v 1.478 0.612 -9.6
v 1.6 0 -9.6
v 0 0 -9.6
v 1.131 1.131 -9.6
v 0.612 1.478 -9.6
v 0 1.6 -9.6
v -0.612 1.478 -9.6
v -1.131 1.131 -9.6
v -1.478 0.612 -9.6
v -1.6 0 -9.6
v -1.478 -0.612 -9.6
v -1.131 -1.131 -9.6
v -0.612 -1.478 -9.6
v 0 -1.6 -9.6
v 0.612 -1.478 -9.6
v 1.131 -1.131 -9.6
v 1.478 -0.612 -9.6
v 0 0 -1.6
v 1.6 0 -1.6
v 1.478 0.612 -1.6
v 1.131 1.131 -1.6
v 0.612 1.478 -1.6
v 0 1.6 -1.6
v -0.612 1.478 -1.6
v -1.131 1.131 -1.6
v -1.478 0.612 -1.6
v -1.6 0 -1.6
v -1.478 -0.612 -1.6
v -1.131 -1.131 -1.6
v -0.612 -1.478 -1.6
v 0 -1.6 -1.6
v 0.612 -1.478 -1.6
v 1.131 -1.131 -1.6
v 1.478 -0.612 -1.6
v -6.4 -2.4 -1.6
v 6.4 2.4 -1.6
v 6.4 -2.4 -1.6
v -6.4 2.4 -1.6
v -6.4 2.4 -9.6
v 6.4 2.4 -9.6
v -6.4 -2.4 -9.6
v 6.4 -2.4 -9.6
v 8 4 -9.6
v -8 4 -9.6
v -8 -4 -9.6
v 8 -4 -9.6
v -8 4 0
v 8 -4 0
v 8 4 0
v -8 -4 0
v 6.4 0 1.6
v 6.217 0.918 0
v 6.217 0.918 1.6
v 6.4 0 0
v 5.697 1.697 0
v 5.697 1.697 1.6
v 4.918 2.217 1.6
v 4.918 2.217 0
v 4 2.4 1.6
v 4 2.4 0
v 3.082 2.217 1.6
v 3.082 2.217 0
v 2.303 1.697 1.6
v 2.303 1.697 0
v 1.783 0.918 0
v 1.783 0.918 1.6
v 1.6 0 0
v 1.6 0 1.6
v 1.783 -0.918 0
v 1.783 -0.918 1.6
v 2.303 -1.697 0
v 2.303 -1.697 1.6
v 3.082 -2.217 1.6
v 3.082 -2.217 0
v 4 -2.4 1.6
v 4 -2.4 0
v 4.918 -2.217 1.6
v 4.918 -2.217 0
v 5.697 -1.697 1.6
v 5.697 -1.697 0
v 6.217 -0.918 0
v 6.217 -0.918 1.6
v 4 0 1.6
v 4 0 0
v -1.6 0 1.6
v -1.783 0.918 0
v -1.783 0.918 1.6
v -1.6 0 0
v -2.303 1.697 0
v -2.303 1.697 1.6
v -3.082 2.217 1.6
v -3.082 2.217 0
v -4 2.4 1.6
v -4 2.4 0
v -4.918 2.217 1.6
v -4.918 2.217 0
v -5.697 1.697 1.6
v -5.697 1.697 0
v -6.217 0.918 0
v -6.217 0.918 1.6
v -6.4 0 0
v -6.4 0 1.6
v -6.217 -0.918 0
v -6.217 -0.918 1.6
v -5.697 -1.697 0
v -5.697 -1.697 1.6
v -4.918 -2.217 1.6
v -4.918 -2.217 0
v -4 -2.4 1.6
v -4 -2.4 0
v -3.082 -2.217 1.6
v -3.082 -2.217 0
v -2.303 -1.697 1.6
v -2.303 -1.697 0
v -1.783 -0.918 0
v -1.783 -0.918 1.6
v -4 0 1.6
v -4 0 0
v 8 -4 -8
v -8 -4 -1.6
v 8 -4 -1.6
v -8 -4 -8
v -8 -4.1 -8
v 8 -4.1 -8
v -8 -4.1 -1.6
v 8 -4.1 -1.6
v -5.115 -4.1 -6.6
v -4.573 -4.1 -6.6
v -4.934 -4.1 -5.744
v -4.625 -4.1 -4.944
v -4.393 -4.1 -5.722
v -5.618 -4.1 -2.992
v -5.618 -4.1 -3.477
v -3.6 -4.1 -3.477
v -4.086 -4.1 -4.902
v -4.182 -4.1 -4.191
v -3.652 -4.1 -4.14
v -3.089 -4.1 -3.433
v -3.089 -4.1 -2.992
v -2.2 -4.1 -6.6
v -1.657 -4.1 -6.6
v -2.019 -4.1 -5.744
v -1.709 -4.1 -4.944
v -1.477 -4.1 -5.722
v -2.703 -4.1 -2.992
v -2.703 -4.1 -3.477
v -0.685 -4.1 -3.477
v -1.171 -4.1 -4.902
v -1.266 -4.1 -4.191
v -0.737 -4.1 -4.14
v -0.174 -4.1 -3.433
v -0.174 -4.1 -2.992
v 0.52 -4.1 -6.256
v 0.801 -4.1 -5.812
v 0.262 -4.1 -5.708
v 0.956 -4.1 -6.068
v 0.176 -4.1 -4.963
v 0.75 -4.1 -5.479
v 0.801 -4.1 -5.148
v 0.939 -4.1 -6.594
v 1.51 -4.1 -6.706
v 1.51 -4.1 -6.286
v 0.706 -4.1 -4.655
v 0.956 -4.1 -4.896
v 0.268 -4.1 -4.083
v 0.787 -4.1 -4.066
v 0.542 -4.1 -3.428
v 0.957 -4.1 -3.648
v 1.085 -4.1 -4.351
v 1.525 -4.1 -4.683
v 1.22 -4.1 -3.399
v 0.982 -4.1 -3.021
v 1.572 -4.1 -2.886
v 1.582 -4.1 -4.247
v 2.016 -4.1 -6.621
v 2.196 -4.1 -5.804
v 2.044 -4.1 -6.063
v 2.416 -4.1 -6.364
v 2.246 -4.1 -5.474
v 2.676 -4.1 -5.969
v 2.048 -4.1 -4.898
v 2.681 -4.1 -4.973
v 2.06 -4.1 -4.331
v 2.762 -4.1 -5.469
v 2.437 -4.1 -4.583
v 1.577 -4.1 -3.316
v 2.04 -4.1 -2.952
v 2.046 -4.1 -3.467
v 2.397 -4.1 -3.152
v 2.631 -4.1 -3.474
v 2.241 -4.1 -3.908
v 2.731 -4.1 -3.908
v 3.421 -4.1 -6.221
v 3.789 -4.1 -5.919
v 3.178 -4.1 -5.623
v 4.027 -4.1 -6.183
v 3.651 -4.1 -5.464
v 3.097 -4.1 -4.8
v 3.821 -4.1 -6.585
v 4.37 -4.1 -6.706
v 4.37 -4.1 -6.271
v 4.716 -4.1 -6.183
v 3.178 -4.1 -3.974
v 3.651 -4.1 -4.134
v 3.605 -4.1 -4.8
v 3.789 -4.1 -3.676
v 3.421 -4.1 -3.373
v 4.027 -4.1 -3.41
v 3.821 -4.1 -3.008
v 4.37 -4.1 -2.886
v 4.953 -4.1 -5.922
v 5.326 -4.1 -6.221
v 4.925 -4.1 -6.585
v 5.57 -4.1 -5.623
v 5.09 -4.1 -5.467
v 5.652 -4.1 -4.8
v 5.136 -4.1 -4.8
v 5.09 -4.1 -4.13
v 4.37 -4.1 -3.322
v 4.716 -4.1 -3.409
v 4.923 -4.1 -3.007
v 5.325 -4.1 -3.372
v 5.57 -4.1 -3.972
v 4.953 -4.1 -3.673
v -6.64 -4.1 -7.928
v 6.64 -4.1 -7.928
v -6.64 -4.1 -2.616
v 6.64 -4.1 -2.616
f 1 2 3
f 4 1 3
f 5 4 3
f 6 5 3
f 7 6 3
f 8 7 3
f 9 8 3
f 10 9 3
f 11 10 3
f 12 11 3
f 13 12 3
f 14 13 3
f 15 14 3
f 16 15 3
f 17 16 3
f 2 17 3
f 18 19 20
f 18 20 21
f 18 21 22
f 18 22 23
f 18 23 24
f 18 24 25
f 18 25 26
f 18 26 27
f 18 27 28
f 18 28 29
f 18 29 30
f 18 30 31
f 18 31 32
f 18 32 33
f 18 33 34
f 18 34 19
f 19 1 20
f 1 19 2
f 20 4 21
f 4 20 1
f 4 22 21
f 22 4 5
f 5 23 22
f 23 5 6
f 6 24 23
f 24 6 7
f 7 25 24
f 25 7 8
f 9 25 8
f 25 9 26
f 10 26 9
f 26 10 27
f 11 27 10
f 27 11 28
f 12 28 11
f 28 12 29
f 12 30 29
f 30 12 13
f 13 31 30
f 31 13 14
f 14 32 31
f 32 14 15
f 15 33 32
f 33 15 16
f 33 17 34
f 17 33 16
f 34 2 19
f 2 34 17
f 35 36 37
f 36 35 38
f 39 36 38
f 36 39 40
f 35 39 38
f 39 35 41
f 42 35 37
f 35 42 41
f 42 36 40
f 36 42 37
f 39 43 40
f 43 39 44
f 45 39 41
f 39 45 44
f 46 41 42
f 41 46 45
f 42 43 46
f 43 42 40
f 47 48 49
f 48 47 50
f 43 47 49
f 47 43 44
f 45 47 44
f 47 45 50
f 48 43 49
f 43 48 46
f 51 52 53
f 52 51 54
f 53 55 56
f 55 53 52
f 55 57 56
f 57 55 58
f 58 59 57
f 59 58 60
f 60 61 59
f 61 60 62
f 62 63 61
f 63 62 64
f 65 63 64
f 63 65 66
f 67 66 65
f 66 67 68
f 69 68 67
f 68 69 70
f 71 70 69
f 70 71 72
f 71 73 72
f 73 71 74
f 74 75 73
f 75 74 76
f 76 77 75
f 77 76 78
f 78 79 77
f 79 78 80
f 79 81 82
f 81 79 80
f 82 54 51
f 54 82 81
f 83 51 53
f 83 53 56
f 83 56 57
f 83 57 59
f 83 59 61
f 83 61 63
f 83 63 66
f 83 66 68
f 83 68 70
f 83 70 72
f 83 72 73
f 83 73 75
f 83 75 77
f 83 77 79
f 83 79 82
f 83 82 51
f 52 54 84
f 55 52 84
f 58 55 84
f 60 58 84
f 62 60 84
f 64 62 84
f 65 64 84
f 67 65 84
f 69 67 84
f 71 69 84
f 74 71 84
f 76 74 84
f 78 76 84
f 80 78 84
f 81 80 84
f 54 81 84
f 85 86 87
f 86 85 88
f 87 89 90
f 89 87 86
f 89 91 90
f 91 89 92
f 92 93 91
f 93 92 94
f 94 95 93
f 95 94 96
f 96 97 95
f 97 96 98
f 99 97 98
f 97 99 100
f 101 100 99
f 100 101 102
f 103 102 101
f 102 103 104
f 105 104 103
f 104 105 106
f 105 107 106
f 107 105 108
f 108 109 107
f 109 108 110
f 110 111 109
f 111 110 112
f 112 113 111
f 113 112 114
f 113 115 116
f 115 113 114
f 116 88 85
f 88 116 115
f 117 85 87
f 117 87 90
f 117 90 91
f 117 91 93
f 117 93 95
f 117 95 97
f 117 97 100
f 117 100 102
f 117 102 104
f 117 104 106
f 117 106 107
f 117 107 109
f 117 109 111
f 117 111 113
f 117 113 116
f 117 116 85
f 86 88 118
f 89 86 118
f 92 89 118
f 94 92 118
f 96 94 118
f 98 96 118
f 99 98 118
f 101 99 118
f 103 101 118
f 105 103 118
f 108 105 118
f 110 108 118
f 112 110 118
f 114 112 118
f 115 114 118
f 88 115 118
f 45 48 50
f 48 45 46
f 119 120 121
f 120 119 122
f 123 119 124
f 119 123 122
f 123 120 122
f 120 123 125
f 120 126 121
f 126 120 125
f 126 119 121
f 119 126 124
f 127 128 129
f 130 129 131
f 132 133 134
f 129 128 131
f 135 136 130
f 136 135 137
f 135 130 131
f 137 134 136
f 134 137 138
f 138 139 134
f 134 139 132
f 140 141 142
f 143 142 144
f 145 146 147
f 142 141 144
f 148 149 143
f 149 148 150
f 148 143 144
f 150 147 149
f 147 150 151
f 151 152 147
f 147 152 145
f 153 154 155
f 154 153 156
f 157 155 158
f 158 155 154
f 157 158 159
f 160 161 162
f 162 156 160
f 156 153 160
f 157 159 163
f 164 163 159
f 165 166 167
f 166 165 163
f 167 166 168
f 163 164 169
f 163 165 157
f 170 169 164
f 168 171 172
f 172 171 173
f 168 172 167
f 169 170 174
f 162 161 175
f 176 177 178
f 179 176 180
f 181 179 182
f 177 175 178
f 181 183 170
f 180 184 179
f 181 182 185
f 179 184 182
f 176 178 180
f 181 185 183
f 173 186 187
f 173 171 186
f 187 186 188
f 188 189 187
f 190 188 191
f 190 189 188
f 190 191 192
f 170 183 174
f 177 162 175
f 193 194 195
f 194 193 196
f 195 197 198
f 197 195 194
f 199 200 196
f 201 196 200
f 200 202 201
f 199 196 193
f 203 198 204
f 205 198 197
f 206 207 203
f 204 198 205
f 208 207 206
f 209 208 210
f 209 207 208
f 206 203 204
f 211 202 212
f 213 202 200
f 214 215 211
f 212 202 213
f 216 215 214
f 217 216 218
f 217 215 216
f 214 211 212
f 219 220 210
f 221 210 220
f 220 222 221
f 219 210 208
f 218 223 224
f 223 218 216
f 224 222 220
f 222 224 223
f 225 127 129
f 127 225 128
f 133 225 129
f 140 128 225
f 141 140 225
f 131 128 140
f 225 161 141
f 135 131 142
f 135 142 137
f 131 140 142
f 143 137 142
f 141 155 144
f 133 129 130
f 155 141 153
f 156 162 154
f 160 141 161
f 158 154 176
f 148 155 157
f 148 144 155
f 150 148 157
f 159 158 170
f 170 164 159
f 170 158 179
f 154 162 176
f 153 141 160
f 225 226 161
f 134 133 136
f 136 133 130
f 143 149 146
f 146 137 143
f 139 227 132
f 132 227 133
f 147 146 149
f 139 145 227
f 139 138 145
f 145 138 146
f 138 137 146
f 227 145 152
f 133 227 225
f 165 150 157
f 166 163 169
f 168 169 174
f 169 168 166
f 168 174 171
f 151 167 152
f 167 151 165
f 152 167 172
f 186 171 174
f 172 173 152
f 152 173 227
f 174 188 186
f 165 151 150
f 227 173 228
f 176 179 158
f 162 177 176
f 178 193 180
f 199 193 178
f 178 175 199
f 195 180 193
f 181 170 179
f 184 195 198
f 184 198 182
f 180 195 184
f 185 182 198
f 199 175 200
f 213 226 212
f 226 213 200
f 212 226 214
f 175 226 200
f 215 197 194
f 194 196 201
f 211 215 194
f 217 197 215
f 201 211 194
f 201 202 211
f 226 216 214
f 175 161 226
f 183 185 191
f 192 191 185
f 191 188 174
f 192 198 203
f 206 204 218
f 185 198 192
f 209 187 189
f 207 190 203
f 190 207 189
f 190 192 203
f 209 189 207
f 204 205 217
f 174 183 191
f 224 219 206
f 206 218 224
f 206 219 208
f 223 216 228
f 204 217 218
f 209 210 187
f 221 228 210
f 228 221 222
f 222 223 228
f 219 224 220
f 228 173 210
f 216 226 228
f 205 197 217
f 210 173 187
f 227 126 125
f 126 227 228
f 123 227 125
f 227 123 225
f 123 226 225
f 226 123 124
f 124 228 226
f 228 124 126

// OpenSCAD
// file: ../p/4-4edge.scad
use <../lib.scad>
function ldraw_lib__4_4edge() = [
// 0 Circle 1.0
// 0 Name: 4-4edge.dat
// 0 Author: James Jessiman
// 0 !LDRAW_ORG Primitive UPDATE 2017-01
// 0 !LICENSE Licensed under CC BY 2.0 and CC BY 4.0 : see CAreadme.txt
// 
// 0 BFC CERTIFY CCW
  [0,"BFC","CERTIFY"],
  [0,"BFC","CCW"],
// 
// 0 !HISTORY 1998-12-15 [PTadmin] Official Update 1998-10
// 0 !HISTORY 2005-12-28 [PTadmin] Official Update 2005-01
// 0 !HISTORY 2007-06-24 [PTadmin] Header formatted for Contributor Agreement
// 0 !HISTORY 2008-07-01 [PTadmin] Official Update 2008-01
// 0 !HISTORY 2017-01-15 [Steffen] BFCed
// 0 !HISTORY 2017-12-30 [PTadmin] Official Update 2017-01
// 
// 
// 2 24 1 0 0 0.9239 0 0.3827
  [2,24,1,0,0,0.9239,0,0.3827],
// 2 24 0.9239 0 0.3827 0.7071 0 0.7071
  [2,24,0.9239,0,0.3827,0.7071,0,0.7071],
// 2 24 0.7071 0 0.7071 0.3827 0 0.9239
  [2,24,0.7071,0,0.7071,0.3827,0,0.9239],
// 2 24 0.3827 0 0.9239 0 0 1
  [2,24,0.3827,0,0.9239,0,0,1],
// 2 24 0 0 1 -0.3827 0 0.9239
  [2,24,0,0,1,-0.3827,0,0.9239],
// 2 24 -0.3827 0 0.9239 -0.7071 0 0.7071
  [2,24,-0.3827,0,0.9239,-0.7071,0,0.7071],
// 2 24 -0.7071 0 0.7071 -0.9239 0 0.3827
  [2,24,-0.7071,0,0.7071,-0.9239,0,0.3827],
// 2 24 -0.9239 0 0.3827 -1 0 -0
  [2,24,-0.9239,0,0.3827,-1,0,-0],
// 2 24 -1 0 -0 -0.9239 0 -0.3827
  [2,24,-1,0,-0,-0.9239,0,-0.3827],
// 2 24 -0.9239 0 -0.3827 -0.7071 0 -0.7071
  [2,24,-0.9239,0,-0.3827,-0.7071,0,-0.7071],
// 2 24 -0.7071 0 -0.7071 -0.3827 0 -0.9239
  [2,24,-0.7071,0,-0.7071,-0.3827,0,-0.9239],
// 2 24 -0.3827 0 -0.9239 0 0 -1
  [2,24,-0.3827,0,-0.9239,0,0,-1],
// 2 24 0 0 -1 0.3827 0 -0.9239
  [2,24,0,0,-1,0.3827,0,-0.9239],
// 2 24 0.3827 0 -0.9239 0.7071 0 -0.7071
  [2,24,0.3827,0,-0.9239,0.7071,0,-0.7071],
// 2 24 0.7071 0 -0.7071 0.9239 0 -0.3827
  [2,24,0.7071,0,-0.7071,0.9239,0,-0.3827],
// 2 24 0.9239 0 -0.3827 1 0 0
  [2,24,0.9239,0,-0.3827,1,0,0],
];
module ldraw_lib__4_4edge(step=0, col=false, unit=2/5, alt=false, line=0.2, solid=!$preview)
    makepoly(ldraw_lib__4_4edge(), step=step, col=col, unit=unit, alt=alt, line=line, solid=solid);
ldraw_lib__4_4edge(line=0.2);
// file: ../p/4-4disc.scad
use <../lib.scad>
function ldraw_lib__4_4disc() = [
// 0 Disc 1.0
// 0 Name: 4-4disc.dat
// 0 Author: James Jessiman
// 0 !LDRAW_ORG Primitive UPDATE 2002-02
// 0 !LICENSE Licensed under CC BY 2.0 and CC BY 4.0 : see CAreadme.txt
// 
// 0 BFC CERTIFY CCW
  [0,"BFC","CERTIFY"],
  [0,"BFC","CCW"],
// 
// 0 !HISTORY 1998-12-15 [PTadmin] Official Update 1998-10
// 0 !HISTORY 2002-03-23 [sbliss] Added BFC statement
// 0 !HISTORY 2002-04-25 [PTadmin] Official Update 2002-02
// 0 !HISTORY 2007-06-24 [PTadmin] Header formatted for Contributor Agreement
// 0 !HISTORY 2008-07-01 [PTadmin] Official Update 2008-01
// 
// 
// 3 16 0 0 0 1 0 0 0.9239 0 0.3827
  [3,16,0,0,0,1,0,0,0.9239,0,0.3827],
// 3 16 0 0 0 0.9239 0 0.3827 0.7071 0 0.7071
  [3,16,0,0,0,0.9239,0,0.3827,0.7071,0,0.7071],
// 3 16 0 0 0 0.7071 0 0.7071 0.3827 0 0.9239
  [3,16,0,0,0,0.7071,0,0.7071,0.3827,0,0.9239],
// 3 16 0 0 0 0.3827 0 0.9239 0 0 1
  [3,16,0,0,0,0.3827,0,0.9239,0,0,1],
// 3 16 0 0 0 0 0 1 -0.3827 0 0.9239
  [3,16,0,0,0,0,0,1,-0.3827,0,0.9239],
// 3 16 0 0 0 -0.3827 0 0.9239 -0.7071 0 0.7071
  [3,16,0,0,0,-0.3827,0,0.9239,-0.7071,0,0.7071],
// 3 16 0 0 0 -0.7071 0 0.7071 -0.9239 0 0.3827
  [3,16,0,0,0,-0.7071,0,0.7071,-0.9239,0,0.3827],
// 3 16 0 0 0 -0.9239 0 0.3827 -1 0 -0
  [3,16,0,0,0,-0.9239,0,0.3827,-1,0,-0],
// 3 16 0 0 0 -1 0 -0 -0.9239 0 -0.3827
  [3,16,0,0,0,-1,0,-0,-0.9239,0,-0.3827],
// 3 16 0 0 0 -0.9239 0 -0.3827 -0.7071 0 -0.7071
  [3,16,0,0,0,-0.9239,0,-0.3827,-0.7071,0,-0.7071],
// 3 16 0 0 0 -0.7071 0 -0.7071 -0.3827 0 -0.9239
  [3,16,0,0,0,-0.7071,0,-0.7071,-0.3827,0,-0.9239],
// 3 16 0 0 0 -0.3827 0 -0.9239 0 0 -1
  [3,16,0,0,0,-0.3827,0,-0.9239,0,0,-1],
// 3 16 0 0 0 0 0 -1 0.3827 0 -0.9239
  [3,16,0,0,0,0,0,-1,0.3827,0,-0.9239],
// 3 16 0 0 0 0.3827 0 -0.9239 0.7071 0 -0.7071
  [3,16,0,0,0,0.3827,0,-0.9239,0.7071,0,-0.7071],
// 3 16 0 0 0 0.7071 0 -0.7071 0.9239 0 -0.3827
  [3,16,0,0,0,0.7071,0,-0.7071,0.9239,0,-0.3827],
// 3 16 0 0 0 0.9239 0 -0.3827 1 0 0
  [3,16,0,0,0,0.9239,0,-0.3827,1,0,0],
// 0
];
module ldraw_lib__4_4disc(step=0, col=false, unit=2/5, alt=false, line=0.2, solid=!$preview)
    makepoly(ldraw_lib__4_4disc(), step=step, col=col, unit=unit, alt=alt, line=line, solid=solid);
ldraw_lib__4_4disc(line=0.2);
// file: ../p/4-4cyli.scad
use <../lib.scad>
$fa=1; $fs=0.2;
function ldraw_lib__4_4cyli(realsolid=false) = [
// 0 Cylinder 1.0
// 0 Name: 4-4cyli.dat
// 0 Author: James Jessiman
// 0 !LDRAW_ORG Primitive UPDATE 2005-01
// 0 !LICENSE Licensed under CC BY 2.0 and CC BY 4.0 : see CAreadme.txt
// 
// 0 BFC CERTIFY CCW
  [0,"BFC","CERTIFY"],
  [0,"BFC","CCW"],
// 
// 0 !HISTORY 1998-12-15 [PTadmin] Official Update 1998-10
// 0 !HISTORY 2002-03-23 [sbliss] Added BFC statement; merged headers from files in distributions LDraw 0.27 and Complete.
// 0 !HISTORY 2002-04-25 [PTadmin] Official Update 2002-02
// 0 !HISTORY 2004-12-14 [guyvivan] BFC CCW
// 0 !HISTORY 2005-12-28 [PTadmin] Official Update 2005-01
// 0 !HISTORY 2007-06-24 [PTadmin] Header formatted for Contributor Agreement
// 0 !HISTORY 2008-07-01 [PTadmin] Official Update 2008-01
// 
// 
// 4 16 1 1 0 0.9239 1 0.3827 0.9239 0 0.3827 1 0 0
  [4,16,1,1,0,0.9239,1,0.3827,0.9239,0,0.3827,1,0,0],
// 5 24 1 0 0 1 1 0 0.9239 0 0.3827 0.9239 0 -0.3827
  [5,24,1,0,0,1,1,0,0.9239,0,0.3827,0.9239,0,-0.3827],
// 4 16 0.9239 1 0.3827 0.7071 1 0.7071 0.7071 0 0.7071 0.9239 0 0.3827
  [4,16,0.9239,1,0.3827,0.7071,1,0.7071,0.7071,0,0.7071,0.9239,0,0.3827],
// 5 24 0.9239 0 0.3827 0.9239 1 0.3827 0.7071 0 0.7071 1 0 0
  [5,24,0.9239,0,0.3827,0.9239,1,0.3827,0.7071,0,0.7071,1,0,0],
// 4 16 0.7071 1 0.7071 0.3827 1 0.9239 0.3827 0 0.9239 0.7071 0 0.7071
  [4,16,0.7071,1,0.7071,0.3827,1,0.9239,0.3827,0,0.9239,0.7071,0,0.7071],
// 5 24 0.7071 0 0.7071 0.7071 1 0.7071 0.3827 0 0.9239 0.9239 0 0.3827
  [5,24,0.7071,0,0.7071,0.7071,1,0.7071,0.3827,0,0.9239,0.9239,0,0.3827],
// 4 16 0.3827 1 0.9239 0 1 1 0 0 1 0.3827 0 0.9239
  [4,16,0.3827,1,0.9239,0,1,1,0,0,1,0.3827,0,0.9239],
// 5 24 0.3827 0 0.9239 0.3827 1 0.9239 0 0 1 0.7071 0 0.7071
  [5,24,0.3827,0,0.9239,0.3827,1,0.9239,0,0,1,0.7071,0,0.7071],
// 4 16 0 1 1 -0.3827 1 0.9239 -0.3827 0 0.9239 0 0 1
  [4,16,0,1,1,-0.3827,1,0.9239,-0.3827,0,0.9239,0,0,1],
// 5 24 0 0 1 0 1 1 -0.3827 0 0.9239 0.3827 0 0.9239
  [5,24,0,0,1,0,1,1,-0.3827,0,0.9239,0.3827,0,0.9239],
// 4 16 -0.3827 1 0.9239 -0.7071 1 0.7071 -0.7071 0 0.7071 -0.3827 0 0.9239
  [4,16,-0.3827,1,0.9239,-0.7071,1,0.7071,-0.7071,0,0.7071,-0.3827,0,0.9239],
// 5 24 -0.3827 0 0.9239 -0.3827 1 0.9239 -0.7071 0 0.7071 0 0 1
  [5,24,-0.3827,0,0.9239,-0.3827,1,0.9239,-0.7071,0,0.7071,0,0,1],
// 4 16 -0.7071 1 0.7071 -0.9239 1 0.3827 -0.9239 0 0.3827 -0.7071 0 0.7071
  [4,16,-0.7071,1,0.7071,-0.9239,1,0.3827,-0.9239,0,0.3827,-0.7071,0,0.7071],
// 5 24 -0.7071 0 0.7071 -0.7071 1 0.7071 -0.9239 0 0.3827 -0.3827 0 0.9239
  [5,24,-0.7071,0,0.7071,-0.7071,1,0.7071,-0.9239,0,0.3827,-0.3827,0,0.9239],
// 4 16 -0.9239 1 0.3827 -1 1 0 -1 0 0 -0.9239 0 0.3827
  [4,16,-0.9239,1,0.3827,-1,1,0,-1,0,0,-0.9239,0,0.3827],
// 5 24 -0.9239 0 0.3827 -0.9239 1 0.3827 -1 0 0 -0.7071 0 0.7071
  [5,24,-0.9239,0,0.3827,-0.9239,1,0.3827,-1,0,0,-0.7071,0,0.7071],
// 4 16 -1 1 0 -0.9239 1 -0.3827 -0.9239 0 -0.3827 -1 0 0
  [4,16,-1,1,0,-0.9239,1,-0.3827,-0.9239,0,-0.3827,-1,0,0],
// 5 24 -1 0 0 -1 1 0 -0.9239 0 -0.3827 -0.9239 0 0.3827
  [5,24,-1,0,0,-1,1,0,-0.9239,0,-0.3827,-0.9239,0,0.3827],
// 4 16 -0.9239 1 -0.3827 -0.7071 1 -0.7071 -0.7071 0 -0.7071 -0.9239 0 -0.3827
  [4,16,-0.9239,1,-0.3827,-0.7071,1,-0.7071,-0.7071,0,-0.7071,-0.9239,0,-0.3827],
// 5 24 -0.9239 0 -0.3827 -0.9239 1 -0.3827 -0.7071 0 -0.7071 -1 0 0
  [5,24,-0.9239,0,-0.3827,-0.9239,1,-0.3827,-0.7071,0,-0.7071,-1,0,0],
// 4 16 -0.7071 1 -0.7071 -0.3827 1 -0.9239 -0.3827 0 -0.9239 -0.7071 0 -0.7071
  [4,16,-0.7071,1,-0.7071,-0.3827,1,-0.9239,-0.3827,0,-0.9239,-0.7071,0,-0.7071],
// 5 24 -0.7071 0 -0.7071 -0.7071 1 -0.7071 -0.3827 0 -0.9239 -0.9239 0 -0.3827
  [5,24,-0.7071,0,-0.7071,-0.7071,1,-0.7071,-0.3827,0,-0.9239,-0.9239,0,-0.3827],
// 4 16 -0.3827 1 -0.9239 0 1 -1 0 0 -1 -0.3827 0 -0.9239
  [4,16,-0.3827,1,-0.9239,0,1,-1,0,0,-1,-0.3827,0,-0.9239],
// 5 24 -0.3827 0 -0.9239 -0.3827 1 -0.9239 0 0 -1 -0.7071 0 -0.7071
  [5,24,-0.3827,0,-0.9239,-0.3827,1,-0.9239,0,0,-1,-0.7071,0,-0.7071],
// 4 16 0 1 -1 0.3827 1 -0.9239 0.3827 0 -0.9239 0 0 -1
  [4,16,0,1,-1,0.3827,1,-0.9239,0.3827,0,-0.9239,0,0,-1],
// 5 24 0 0 -1 0 1 -1 0.3827 0 -0.9239 -0.3827 0 -0.9239
  [5,24,0,0,-1,0,1,-1,0.3827,0,-0.9239,-0.3827,0,-0.9239],
// 4 16 0.3827 1 -0.9239 0.7071 1 -0.7071 0.7071 0 -0.7071 0.3827 0 -0.9239
  [4,16,0.3827,1,-0.9239,0.7071,1,-0.7071,0.7071,0,-0.7071,0.3827,0,-0.9239],
// 5 24 0.3827 0 -0.9239 0.3827 1 -0.9239 0.7071 0 -0.7071 0 0 -1
  [5,24,0.3827,0,-0.9239,0.3827,1,-0.9239,0.7071,0,-0.7071,0,0,-1],
// 4 16 0.7071 1 -0.7071 0.9239 1 -0.3827 0.9239 0 -0.3827 0.7071 0 -0.7071
  [4,16,0.7071,1,-0.7071,0.9239,1,-0.3827,0.9239,0,-0.3827,0.7071,0,-0.7071],
// 5 24 0.7071 0 -0.7071 0.7071 1 -0.7071 0.9239 0 -0.3827 0.3827 0 -0.9239
  [5,24,0.7071,0,-0.7071,0.7071,1,-0.7071,0.9239,0,-0.3827,0.3827,0,-0.9239],
// 4 16 0.9239 1 -0.3827 1 1 0 1 0 0 0.9239 0 -0.3827
  [4,16,0.9239,1,-0.3827,1,1,0,1,0,0,0.9239,0,-0.3827],
// 5 24 0.9239 0 -0.3827 0.9239 1 -0.3827 1 0 0 0.7071 0 -0.7071
  [5,24,0.9239,0,-0.3827,0.9239,1,-0.3827,1,0,0,0.7071,0,-0.7071],
// 0
];
module ldraw_lib__4_4cyli(step=0, col=false, unit=2/5, alt=false, line=0.2, solid=!$preview)
    makepoly(ldraw_lib__4_4cyli(solid), step=step, col=col, unit=unit, alt=alt, line=line, solid=solid);
ldraw_lib__4_4cyli(line=0.2);
// file: ../p/stud3.scad
use <../lib.scad>
use <4-4cyli.scad>
use <4-4disc.scad>
use <4-4edge.scad>
function ldraw_lib__stud3() = [
// 0 Stud Tube Solid
// 0 Name: stud3.dat
// 0 Author: James Jessiman
// 0 !LDRAW_ORG Primitive UPDATE 2012-01
// 0 !LICENSE Licensed under CC BY 4.0 : see CAreadme.txt
// 
// 0 BFC CERTIFY CCW
  [0,"BFC","CERTIFY"],
  [0,"BFC","CCW"],
// 
// 0 !HISTORY 2002-04-04 [sbliss] Modified for BFC compliance
// 0 !HISTORY 2002-04-25 [PTadmin] Official Update 2002-02
// 0 !HISTORY 2007-06-24 [PTadmin] Header formatted for Contributor Agreement
// 0 !HISTORY 2008-07-01 [PTadmin] Official Update 2008-01
// 0 !HISTORY 2012-02-16 [Philo] Changed to CCW
// 0 !HISTORY 2012-03-30 [PTadmin] Official Update 2012-01
// 
// 
// 1 16 0 -4 0 4 0 0 0 1 0 0 0 4 4-4edge.dat
  [1,16,0,-4,0,4,0,0,0,1,0,0,0,4, ldraw_lib__4_4edge()],
// 1 16 0 0 0 4 0 0 0 1 0 0 0 4 4-4edge.dat
  [1,16,0,0,0,4,0,0,0,1,0,0,0,4, ldraw_lib__4_4edge()],
// 1 16 0 -4 0 4 0 0 0 1 0 0 0 4 4-4disc.dat
  [1,16,0,-4,0,4,0,0,0,1,0,0,0,4, ldraw_lib__4_4disc()],
  [-1,16,0,0,0,4,0,0,0,-1,0,0,0,4, ldraw_lib__4_4disc()],
// 1 16 0 -4 0 4 0 0 0 4 0 0 0 4 4-4cyli.dat
  [1,16,0,-4,0,4,0,0,0,4,0,0,0,4, ldraw_lib__4_4cyli()],
];
module ldraw_lib__stud3(step=0, col=false, unit=2/5, alt=false, line=0.2, solid=!$preview)
    makepoly(ldraw_lib__stud3(), step=step, col=col, unit=unit, alt=alt, line=line, solid=solid);
ldraw_lib__stud3(line=0.2);
// file: ../p/stud.scad
use <../lib.scad>
use <4-4cyli.scad>
use <4-4disc.scad>
use <4-4edge.scad>
function ldraw_lib__stud() = [
// 0 Stud
// 0 Name: stud.dat
// 0 Author: James Jessiman
// 0 !LDRAW_ORG Primitive UPDATE 2012-01
// 0 !LICENSE Licensed under CC BY 4.0 : see CAreadme.txt
// 
// 0 BFC CERTIFY CCW
  [0,"BFC","CERTIFY"],
  [0,"BFC","CCW"],
// 
// 0 !HISTORY 2002-04-04 [sbliss] Modified for BFC compliance
// 0 !HISTORY 2002-04-25 [PTadmin] Official Update 2002-02
// 0 !HISTORY 2007-06-24 [PTadmin] Header formatted for Contributor Agreement
// 0 !HISTORY 2008-07-01 [PTadmin] Official Update 2008-01
// 0 !HISTORY 2012-02-16 [Philo] Changed to CCW
// 0 !HISTORY 2012-03-30 [PTadmin] Official Update 2012-01
// 
// 
// 1 16 0 0 0 6 0 0 0 1 0 0 0 6 4-4edge.dat
  [1,16,0,0,0,6,0,0,0,1,0,0,0,6, ldraw_lib__4_4edge()],
// 1 16 0 -4 0 6 0 0 0 1 0 0 0 6 4-4edge.dat
  [1,16,0,-4,0,6,0,0,0,1,0,0,0,6, ldraw_lib__4_4edge()],
// 1 16 0 0 0 6 0 0 0 -4 0 0 0 6 4-4cyli.dat
  [1,16,0,0,0,6,0,0,0,-4,0,0,0,6, ldraw_lib__4_4cyli()],
// 1 16 0 -4 0 6 0 0 0 1 0 0 0 6 4-4disc.dat
  [1,16,0,-4,0,6,0,0,0,1,0,0,0,6, ldraw_lib__4_4disc()],
  [-1,16,0,0,0,6,0,0,0,-1,0,0,0,6, ldraw_lib__4_4disc()],
];
module ldraw_lib__stud(step=0, col=false, unit=2/5, alt=false, line=0.2, solid=!$preview)
    makepoly(ldraw_lib__stud(), step=step, col=col, unit=unit, alt=alt, line=line, solid=solid);
ldraw_lib__stud(line=0.2);
// file: ../p/box5.scad
use <../lib.scad>
function ldraw_lib__box5() = [
// 0 Box with 5 Faces and All Edges
// 0 Name: box5.dat
// 0 Author: James Jessiman
// 0 !LDRAW_ORG Primitive UPDATE 2012-01
// 0 !LICENSE Licensed under CC BY 2.0 and CC BY 4.0 : see CAreadme.txt
// 
// 0 BFC CERTIFY CCW
  [0,"BFC","CERTIFY"],
  [0,"BFC","CCW"],
// 
// 0 !HISTORY 2002-04-03 [sbliss] Modified for BFC compliance
// 0 !HISTORY 2002-04-25 [PTadmin] Official Update 2002-02
// 0 !HISTORY 2007-06-24 [PTadmin] Header formatted for Contributor Agreement
// 0 !HISTORY 2008-07-01 [PTadmin] Official Update 2008-01
// 0 !HISTORY 2012-02-16 [Philo] Changed to CCW
// 0 !HISTORY 2012-03-30 [PTadmin] Official Update 2012-01
// 
// 
// 2 24 1 1 1 -1 1 1
  [2,24,1,1,1,-1,1,1],
// 2 24 -1 1 1 -1 1 -1
  [2,24,-1,1,1,-1,1,-1],
// 2 24 -1 1 -1 1 1 -1
  [2,24,-1,1,-1,1,1,-1],
// 2 24 1 1 -1 1 1 1
  [2,24,1,1,-1,1,1,1],
// 2 24 1 0 1 -1 0 1
  [2,24,1,0,1,-1,0,1],
// 2 24 -1 0 1 -1 0 -1
  [2,24,-1,0,1,-1,0,-1],
// 2 24 -1 0 -1 1 0 -1
  [2,24,-1,0,-1,1,0,-1],
// 2 24 1 0 -1 1 0 1
  [2,24,1,0,-1,1,0,1],
// 2 24 1 0 1 1 1 1
  [2,24,1,0,1,1,1,1],
// 2 24 -1 0 1 -1 1 1
  [2,24,-1,0,1,-1,1,1],
// 2 24 1 0 -1 1 1 -1
  [2,24,1,0,-1,1,1,-1],
// 2 24 -1 0 -1 -1 1 -1
  [2,24,-1,0,-1,-1,1,-1],
// 4 16 -1 1 1 1 1 1 1 1 -1 -1 1 -1
  [4,16,-1,1,1,1,1,1,1,1,-1,-1,1,-1],
// 4 16 -1 1 1 -1 0 1 1 0 1 1 1 1
  [4,16,-1,1,1,-1,0,1,1,0,1,1,1,1],
// 4 16 -1 1 -1 -1 0 -1 -1 0 1 -1 1 1
  [4,16,-1,1,-1,-1,0,-1,-1,0,1,-1,1,1],
// 4 16 1 1 -1 1 0 -1 -1 0 -1 -1 1 -1
  [4,16,1,1,-1,1,0,-1,-1,0,-1,-1,1,-1],
// 4 16 1 1 1 1 0 1 1 0 -1 1 1 -1
  [4,16,1,1,1,1,0,1,1,0,-1,1,1,-1],
];
makepoly(ldraw_lib__box5(), line=0.2);
// file: ../p/box4t.scad
use <../lib.scad>
function ldraw_lib__box4t() = [
// 0 Box with 4 Adjacent Faces and All Edges
// 0 Name: box4t.dat
// 0 Author: Tore Eriksson [Tore_Eriksson]
// 0 !LDRAW_ORG Primitive UPDATE 2003-02
// 0 !LICENSE Licensed under CC BY 2.0 and CC BY 4.0 : see CAreadme.txt
// 
// 0 BFC CERTIFY CCW
  [0,"BFC","CERTIFY"],
  [0,"BFC","CCW"],
// 
// 0 !HISTORY 1997-09-29 [PTadmin] Official Update 1997-15
// 0 !HISTORY 2002-08-31 [izanette] Modified with WINDZ for BFC compliance
// 0 !HISTORY 2003-08-01 [PTadmin] Official Update 2003-02
// 0 !HISTORY 2007-06-24 [PTadmin] Header formatted for Contributor Agreement
// 0 !HISTORY 2008-07-01 [PTadmin] Official Update 2008-01
// 
// 
// 2 24 1 1 1 -1 1 1
  [2,24,1,1,1,-1,1,1],
// 2 24 -1 1 1 -1 1 -1
  [2,24,-1,1,1,-1,1,-1],
// 2 24 -1 1 -1 1 1 -1
  [2,24,-1,1,-1,1,1,-1],
// 2 24 1 1 -1 1 1 1
  [2,24,1,1,-1,1,1,1],
// 2 24 1 0 1 -1 0 1
  [2,24,1,0,1,-1,0,1],
// 2 24 -1 0 1 -1 0 -1
  [2,24,-1,0,1,-1,0,-1],
// 2 24 -1 0 -1 1 0 -1
  [2,24,-1,0,-1,1,0,-1],
// 2 24 1 0 -1 1 0 1
  [2,24,1,0,-1,1,0,1],
// 2 24 1 0 1 1 1 1
  [2,24,1,0,1,1,1,1],
// 2 24 -1 0 1 -1 1 1
  [2,24,-1,0,1,-1,1,1],
// 2 24 1 0 -1 1 1 -1
  [2,24,1,0,-1,1,1,-1],
// 2 24 -1 0 -1 -1 1 -1
  [2,24,-1,0,-1,-1,1,-1],
// 4 16 1 1 1 1 1 -1 -1 1 -1 -1 1 1
  [4,16,1,1,1,1,1,-1,-1,1,-1,-1,1,1],
// 4 16 1 1 1 -1 1 1 -1 0 1 1 0 1
  [4,16,1,1,1,-1,1,1,-1,0,1,1,0,1],
// 4 16 -1 1 1 -1 1 -1 -1 0 -1 -1 0 1
  [4,16,-1,1,1,-1,1,-1,-1,0,-1,-1,0,1],
// 0 4 16 -1 1 -1 -1 0 -1 1 0 -1 1 1 -1
// 4 16 1 1 -1 1 1 1 1 0 1 1 0 -1
  [4,16,1,1,-1,1,1,1,1,0,1,1,0,-1],
// 0
];
makepoly(ldraw_lib__box4t(), line=0.2);
// file: s/3004s01.scad
use <../../lib.scad>
use <../../p/box4t.scad>
use <../../p/box5.scad>
use <../../p/stud.scad>
use <../../p/stud3.scad>
$fa=1; $fs=0.2;
function ldraw_lib__s__3004s01(realsolid=false) = [
// 0 ~Brick  1 x  2 without Front Face
// 0 Name: s\3004s01.dat
// 0 Author: James Jessiman
// 0 !LDRAW_ORG Subpart UPDATE 2003-03
// 0 !LICENSE Licensed under CC BY 2.0 and CC BY 4.0 : see CAreadme.txt
// 
// 0 BFC CERTIFY CCW
  [0,"BFC","CERTIFY"],
  [0,"BFC","CCW"],
// 
// 0 !HISTORY 2003-09-07 [jriley] Subfiling, BFC
// 0 !HISTORY 2003-12-19 [PTadmin] Official Update 2003-03
// 0 !HISTORY 2007-08-29 [PTadmin] Header formatted for Contributor Agreement
// 0 !HISTORY 2008-07-01 [PTadmin] Official Update 2008-01
// 
// 
// 1 16 0 4 0 1 0 0 0 -5 0 0 0 1 stud3.dat
  [1,16,0,4,0,1,0,0,0,-5,0,0,0,1, ldraw_lib__stud3(realsolid)],
// 0 BFC INVERTNEXT
  [0,"BFC","INVERTNEXT"],
// 1 16 0 24 0 16 0 0 0 -20 0 0 0 6 box5.dat
  [1,16,0,24,0,16,0,0,0,-20,0,0,0,6, ldraw_lib__box5(realsolid)],
// 4 16 20 24 10 16 24 6 -16 24 6 -20 24 10
  [4,16,20,24,10,16,24,6,-16,24,6,-20,24,10],
// 4 16 -20 24 10 -16 24 6 -16 24 -6 -20 24 -10
  [4,16,-20,24,10,-16,24,6,-16,24,-6,-20,24,-10],
// 4 16 -20 24 -10 -16 24 -6 16 24 -6 20 24 -10
  [4,16,-20,24,-10,-16,24,-6,16,24,-6,20,24,-10],
// 4 16 20 24 -10 16 24 -6 16 24 6 20 24 10
  [4,16,20,24,-10,16,24,-6,16,24,6,20,24,10],
// 1 16 0 24 0 20 0 0 0 -24 0 0 0 10 box4t.dat
  [1,16,0,24,0,20,0,0,0,-24,0,0,0,10, ldraw_lib__box4t(realsolid)],
// 1 16 10 0 0 1 0 0 0 1 0 0 0 1 stud.dat
  [1,16,10,0,0,1,0,0,0,1,0,0,0,1, ldraw_lib__stud(realsolid)],
// 1 16 -10 0 0 1 0 0 0 1 0 0 0 1 stud.dat
  [1,16,-10,0,0,1,0,0,0,1,0,0,0,1, ldraw_lib__stud(realsolid)],
// 0
];
module ldraw_lib__s__3004s01(step=0, col=false, unit=2/5, alt=false, line=0.2, solid=!$preview)
    makepoly(ldraw_lib__s__3004s01(solid), step=step, col=col, unit=unit, alt=alt, line=line, solid=solid);
ldraw_lib__s__3004s01(line=0.2);
// file: ../p/box5-12.scad
use <../lib.scad>
function ldraw_lib__box5_12() = [
// 0 Box with 5 Faces without Any Edges
// 0 Name: box5-12.dat
// 0 Author: Chris Dee [cwdee]
// 0 !LDRAW_ORG Primitive UPDATE 2009-02
// 0 !LICENSE Licensed under CC BY 2.0 and CC BY 4.0 : see CAreadme.txt
// 
// 0 BFC CERTIFY CCW
  [0,"BFC","CERTIFY"],
  [0,"BFC","CCW"],
// 
// 0 !HISTORY 2009-09-03 [PTadmin] Official Update 2009-02
// 
// 
// 4 16 1 1 1 1 1 -1 -1 1 -1 -1 1 1
  [4,16,1,1,1,1,1,-1,-1,1,-1,-1,1,1],
// 4 16 -1 0 1 1 0 1 1 1 1 -1 1 1
  [4,16,-1,0,1,1,0,1,1,1,1,-1,1,1],
// 4 16 -1 0 -1 -1 0 1 -1 1 1 -1 1 -1
  [4,16,-1,0,-1,-1,0,1,-1,1,1,-1,1,-1],
// 4 16 1 0 -1 -1 0 -1 -1 1 -1 1 1 -1
  [4,16,1,0,-1,-1,0,-1,-1,1,-1,1,1,-1],
// 4 16 1 0 1 1 0 -1 1 1 -1 1 1 1
  [4,16,1,0,1,1,0,-1,1,1,-1,1,1,1],
// 0
];
module ldraw_lib__box5_12(step=0, col=false, unit=2/5, alt=false, line=0.2, solid=!$preview)
    makepoly(ldraw_lib__box5_12(), step=step, col=col, unit=unit, alt=alt, line=line, solid=solid);
ldraw_lib__box5_12(line=0.2);
// file: 3004.scad
use <../lib.scad>
use <s/3004s01.scad>
function ldraw_lib__3004() = [
// 0 Brick  1 x  2
// 0 Name: 3004.dat
// 0 Author: James Jessiman
// 0 !LDRAW_ORG Part UPDATE 2022-05
// 0 !LICENSE Licensed under CC BY 2.0 and CC BY 4.0 : see CAreadme.txt
// 
// 0 BFC CERTIFY CCW
  [0,"BFC","CERTIFY"],
  [0,"BFC","CCW"],
// 
// 0 !HISTORY 2001-10-26 [PTadmin] Official Update 2001-01
// 0 !HISTORY 2002-05-07 {unknown} BFC Certification
// 0 !HISTORY 2002-06-11 [PTadmin] Official Update 2002-03
// 0 !HISTORY 2007-05-07 [PTadmin] Header formatted for Contributor Agreement
// 0 !HISTORY 2008-07-01 [PTadmin] Official Update 2008-01
// 0 !HISTORY 2022-08-04 [MagFors] Using subfile
// 0 !HISTORY 2022-09-15 [PTadmin] Official Update 2022-05
// 
// 
// 1 16 0 0 0 1 0 0 0 1 0 0 0 1 s\3004s01.dat
  [1,16,0,0,0,1,0,0,0,1,0,0,0,1, ldraw_lib__s__3004s01()],
// 4 16 -20 24 -10 20 24 -10 20 0 -10 -20 0 -10
  [4,16,-20,24,-10,20,24,-10,20,0,-10,-20,0,-10],
];
module ldraw_lib__3004(step=0, col=false, unit=2/5, alt=false, line=0.2, solid=!$preview)
    makepoly(ldraw_lib__3004(), step=step, col=col, unit=unit, alt=alt, line=line, solid=solid);
ldraw_lib__3004(line=0.2);
// file: 191936b.scad
use <../lib.scad>
use <../p/box5-12.scad>
use <s/191936s01.scad>
$fa=1; $fs=0.2;
function ldraw_lib__191936b(realsolid=false) = [
// 0 Sticker  0.8 x  2 with White "7760"
// 0 Name: 191936b.dat
// 0 Author: Steffen [Steffen]
// 0 !LDRAW_ORG Part UPDATE 2012-01
// 0 !LICENSE Licensed under CC BY 2.0 and CC BY 4.0 : see CAreadme.txt
// 
// 0 BFC CERTIFY CCW
  [0,"BFC","CERTIFY"],
  [0,"BFC","CCW"],
// 
// 0 !HISTORY 2012-03-30 [PTadmin] Official Update 2012-01
// 
// 
// 1 16 0 -0.25 0 20 0 0 0 0.25 0 0 0 -8 box5-12.dat
  [1,16,0,-0.25,0,20,0,0,0,0.25,0,0,0,-8, ldraw_lib__box5_12(realsolid)],
// 1 16 0 -0.25 -4.5 0.415 0 0 0 1 0 0 0 0.415 s\191936s01.dat
  [1,16,0,-0.25,-4.5,0.415,0,0,0,1,0,0,0,0.415, ldraw_lib__s__191936s01(realsolid)],
// 4 16 -20 -0.25 8 -16.6 -0.25 5.46 16.6 -0.25 5.46 20 -0.25 8
  [4,16,-20,-0.25,8,-16.6,-0.25,5.46,16.6,-0.25,5.46,20,-0.25,8],
// 4 16 -16.6 -0.25 5.46 -20 -0.25 8 -20 -0.25 -8 -16.6 -0.25 -7.82
  [4,16,-16.6,-0.25,5.46,-20,-0.25,8,-20,-0.25,-8,-16.6,-0.25,-7.82],
// 4 16 -16.6 -0.25 -7.82 -20 -0.25 -8 20 -0.25 -8 16.6 -0.25 -7.82
  [4,16,-16.6,-0.25,-7.82,-20,-0.25,-8,20,-0.25,-8,16.6,-0.25,-7.82],
// 4 16 20 -0.25 8 16.6 -0.25 5.46 16.6 -0.25 -7.82 20 -0.25 -8
  [4,16,20,-0.25,8,16.6,-0.25,5.46,16.6,-0.25,-7.82,20,-0.25,-8],
// 0
];
module ldraw_lib__191936b(step=0, col=false, unit=2/5, alt=false, line=0.2, solid=!$preview)
    makepoly(ldraw_lib__191936b(solid), step=step, col=col, unit=unit, alt=alt, line=line, solid=solid);
ldraw_lib__191936b(line=0.2);
// main file
use <../lib.scad>
use <191936b.scad>
use <3004.scad>
function ldraw_lib__3004d0l() = [
// 0 Brick  1 x  2 with White "7760" Sticker
// 0 Name: 3004d0l.dat
// 0 Author: Takeshi Takahashi [RainbowDolphin]
// 0 !LDRAW_ORG Shortcut UPDATE 2024-07
// 0 !LICENSE Licensed under CC BY 4.0 : see CAreadme.txt
// 
// 0 BFC CERTIFY CCW
  [0,"BFC","CERTIFY"],
  [0,"BFC","CCW"],
// 
// 0 !CATEGORY Sticker Shortcut
// 0 !KEYWORDS Bricklink 3004pb033, Diesel locomotive, Set 7760, Train
// 
// 0 !HISTORY 2024-08-26 [OrionP] Official Update 2024-07
// 
// 1 16 0 0 0 1 0 0 0 1 0 0 0 1 3004.dat
  [1,16,0,0,0,1,0,0,0,1,0,0,0,1, ldraw_lib__3004()],
// 1 16 0 12 -10 1 0 0 0 0 -1 0 1 0 191936b.dat
  [1,16,0,12,-10,1,0,0,0,0,-1,0,1,0, ldraw_lib__191936b()],
];
module ldraw_lib__3004d0l(step=0, col=false, unit=2/5, alt=false, line=0.2, solid=!$preview)
    makepoly(ldraw_lib__3004d0l(), step=step, col=col, unit=unit, alt=alt, line=line, solid=solid);
ldraw_lib__3004d0l(line=0.2);
